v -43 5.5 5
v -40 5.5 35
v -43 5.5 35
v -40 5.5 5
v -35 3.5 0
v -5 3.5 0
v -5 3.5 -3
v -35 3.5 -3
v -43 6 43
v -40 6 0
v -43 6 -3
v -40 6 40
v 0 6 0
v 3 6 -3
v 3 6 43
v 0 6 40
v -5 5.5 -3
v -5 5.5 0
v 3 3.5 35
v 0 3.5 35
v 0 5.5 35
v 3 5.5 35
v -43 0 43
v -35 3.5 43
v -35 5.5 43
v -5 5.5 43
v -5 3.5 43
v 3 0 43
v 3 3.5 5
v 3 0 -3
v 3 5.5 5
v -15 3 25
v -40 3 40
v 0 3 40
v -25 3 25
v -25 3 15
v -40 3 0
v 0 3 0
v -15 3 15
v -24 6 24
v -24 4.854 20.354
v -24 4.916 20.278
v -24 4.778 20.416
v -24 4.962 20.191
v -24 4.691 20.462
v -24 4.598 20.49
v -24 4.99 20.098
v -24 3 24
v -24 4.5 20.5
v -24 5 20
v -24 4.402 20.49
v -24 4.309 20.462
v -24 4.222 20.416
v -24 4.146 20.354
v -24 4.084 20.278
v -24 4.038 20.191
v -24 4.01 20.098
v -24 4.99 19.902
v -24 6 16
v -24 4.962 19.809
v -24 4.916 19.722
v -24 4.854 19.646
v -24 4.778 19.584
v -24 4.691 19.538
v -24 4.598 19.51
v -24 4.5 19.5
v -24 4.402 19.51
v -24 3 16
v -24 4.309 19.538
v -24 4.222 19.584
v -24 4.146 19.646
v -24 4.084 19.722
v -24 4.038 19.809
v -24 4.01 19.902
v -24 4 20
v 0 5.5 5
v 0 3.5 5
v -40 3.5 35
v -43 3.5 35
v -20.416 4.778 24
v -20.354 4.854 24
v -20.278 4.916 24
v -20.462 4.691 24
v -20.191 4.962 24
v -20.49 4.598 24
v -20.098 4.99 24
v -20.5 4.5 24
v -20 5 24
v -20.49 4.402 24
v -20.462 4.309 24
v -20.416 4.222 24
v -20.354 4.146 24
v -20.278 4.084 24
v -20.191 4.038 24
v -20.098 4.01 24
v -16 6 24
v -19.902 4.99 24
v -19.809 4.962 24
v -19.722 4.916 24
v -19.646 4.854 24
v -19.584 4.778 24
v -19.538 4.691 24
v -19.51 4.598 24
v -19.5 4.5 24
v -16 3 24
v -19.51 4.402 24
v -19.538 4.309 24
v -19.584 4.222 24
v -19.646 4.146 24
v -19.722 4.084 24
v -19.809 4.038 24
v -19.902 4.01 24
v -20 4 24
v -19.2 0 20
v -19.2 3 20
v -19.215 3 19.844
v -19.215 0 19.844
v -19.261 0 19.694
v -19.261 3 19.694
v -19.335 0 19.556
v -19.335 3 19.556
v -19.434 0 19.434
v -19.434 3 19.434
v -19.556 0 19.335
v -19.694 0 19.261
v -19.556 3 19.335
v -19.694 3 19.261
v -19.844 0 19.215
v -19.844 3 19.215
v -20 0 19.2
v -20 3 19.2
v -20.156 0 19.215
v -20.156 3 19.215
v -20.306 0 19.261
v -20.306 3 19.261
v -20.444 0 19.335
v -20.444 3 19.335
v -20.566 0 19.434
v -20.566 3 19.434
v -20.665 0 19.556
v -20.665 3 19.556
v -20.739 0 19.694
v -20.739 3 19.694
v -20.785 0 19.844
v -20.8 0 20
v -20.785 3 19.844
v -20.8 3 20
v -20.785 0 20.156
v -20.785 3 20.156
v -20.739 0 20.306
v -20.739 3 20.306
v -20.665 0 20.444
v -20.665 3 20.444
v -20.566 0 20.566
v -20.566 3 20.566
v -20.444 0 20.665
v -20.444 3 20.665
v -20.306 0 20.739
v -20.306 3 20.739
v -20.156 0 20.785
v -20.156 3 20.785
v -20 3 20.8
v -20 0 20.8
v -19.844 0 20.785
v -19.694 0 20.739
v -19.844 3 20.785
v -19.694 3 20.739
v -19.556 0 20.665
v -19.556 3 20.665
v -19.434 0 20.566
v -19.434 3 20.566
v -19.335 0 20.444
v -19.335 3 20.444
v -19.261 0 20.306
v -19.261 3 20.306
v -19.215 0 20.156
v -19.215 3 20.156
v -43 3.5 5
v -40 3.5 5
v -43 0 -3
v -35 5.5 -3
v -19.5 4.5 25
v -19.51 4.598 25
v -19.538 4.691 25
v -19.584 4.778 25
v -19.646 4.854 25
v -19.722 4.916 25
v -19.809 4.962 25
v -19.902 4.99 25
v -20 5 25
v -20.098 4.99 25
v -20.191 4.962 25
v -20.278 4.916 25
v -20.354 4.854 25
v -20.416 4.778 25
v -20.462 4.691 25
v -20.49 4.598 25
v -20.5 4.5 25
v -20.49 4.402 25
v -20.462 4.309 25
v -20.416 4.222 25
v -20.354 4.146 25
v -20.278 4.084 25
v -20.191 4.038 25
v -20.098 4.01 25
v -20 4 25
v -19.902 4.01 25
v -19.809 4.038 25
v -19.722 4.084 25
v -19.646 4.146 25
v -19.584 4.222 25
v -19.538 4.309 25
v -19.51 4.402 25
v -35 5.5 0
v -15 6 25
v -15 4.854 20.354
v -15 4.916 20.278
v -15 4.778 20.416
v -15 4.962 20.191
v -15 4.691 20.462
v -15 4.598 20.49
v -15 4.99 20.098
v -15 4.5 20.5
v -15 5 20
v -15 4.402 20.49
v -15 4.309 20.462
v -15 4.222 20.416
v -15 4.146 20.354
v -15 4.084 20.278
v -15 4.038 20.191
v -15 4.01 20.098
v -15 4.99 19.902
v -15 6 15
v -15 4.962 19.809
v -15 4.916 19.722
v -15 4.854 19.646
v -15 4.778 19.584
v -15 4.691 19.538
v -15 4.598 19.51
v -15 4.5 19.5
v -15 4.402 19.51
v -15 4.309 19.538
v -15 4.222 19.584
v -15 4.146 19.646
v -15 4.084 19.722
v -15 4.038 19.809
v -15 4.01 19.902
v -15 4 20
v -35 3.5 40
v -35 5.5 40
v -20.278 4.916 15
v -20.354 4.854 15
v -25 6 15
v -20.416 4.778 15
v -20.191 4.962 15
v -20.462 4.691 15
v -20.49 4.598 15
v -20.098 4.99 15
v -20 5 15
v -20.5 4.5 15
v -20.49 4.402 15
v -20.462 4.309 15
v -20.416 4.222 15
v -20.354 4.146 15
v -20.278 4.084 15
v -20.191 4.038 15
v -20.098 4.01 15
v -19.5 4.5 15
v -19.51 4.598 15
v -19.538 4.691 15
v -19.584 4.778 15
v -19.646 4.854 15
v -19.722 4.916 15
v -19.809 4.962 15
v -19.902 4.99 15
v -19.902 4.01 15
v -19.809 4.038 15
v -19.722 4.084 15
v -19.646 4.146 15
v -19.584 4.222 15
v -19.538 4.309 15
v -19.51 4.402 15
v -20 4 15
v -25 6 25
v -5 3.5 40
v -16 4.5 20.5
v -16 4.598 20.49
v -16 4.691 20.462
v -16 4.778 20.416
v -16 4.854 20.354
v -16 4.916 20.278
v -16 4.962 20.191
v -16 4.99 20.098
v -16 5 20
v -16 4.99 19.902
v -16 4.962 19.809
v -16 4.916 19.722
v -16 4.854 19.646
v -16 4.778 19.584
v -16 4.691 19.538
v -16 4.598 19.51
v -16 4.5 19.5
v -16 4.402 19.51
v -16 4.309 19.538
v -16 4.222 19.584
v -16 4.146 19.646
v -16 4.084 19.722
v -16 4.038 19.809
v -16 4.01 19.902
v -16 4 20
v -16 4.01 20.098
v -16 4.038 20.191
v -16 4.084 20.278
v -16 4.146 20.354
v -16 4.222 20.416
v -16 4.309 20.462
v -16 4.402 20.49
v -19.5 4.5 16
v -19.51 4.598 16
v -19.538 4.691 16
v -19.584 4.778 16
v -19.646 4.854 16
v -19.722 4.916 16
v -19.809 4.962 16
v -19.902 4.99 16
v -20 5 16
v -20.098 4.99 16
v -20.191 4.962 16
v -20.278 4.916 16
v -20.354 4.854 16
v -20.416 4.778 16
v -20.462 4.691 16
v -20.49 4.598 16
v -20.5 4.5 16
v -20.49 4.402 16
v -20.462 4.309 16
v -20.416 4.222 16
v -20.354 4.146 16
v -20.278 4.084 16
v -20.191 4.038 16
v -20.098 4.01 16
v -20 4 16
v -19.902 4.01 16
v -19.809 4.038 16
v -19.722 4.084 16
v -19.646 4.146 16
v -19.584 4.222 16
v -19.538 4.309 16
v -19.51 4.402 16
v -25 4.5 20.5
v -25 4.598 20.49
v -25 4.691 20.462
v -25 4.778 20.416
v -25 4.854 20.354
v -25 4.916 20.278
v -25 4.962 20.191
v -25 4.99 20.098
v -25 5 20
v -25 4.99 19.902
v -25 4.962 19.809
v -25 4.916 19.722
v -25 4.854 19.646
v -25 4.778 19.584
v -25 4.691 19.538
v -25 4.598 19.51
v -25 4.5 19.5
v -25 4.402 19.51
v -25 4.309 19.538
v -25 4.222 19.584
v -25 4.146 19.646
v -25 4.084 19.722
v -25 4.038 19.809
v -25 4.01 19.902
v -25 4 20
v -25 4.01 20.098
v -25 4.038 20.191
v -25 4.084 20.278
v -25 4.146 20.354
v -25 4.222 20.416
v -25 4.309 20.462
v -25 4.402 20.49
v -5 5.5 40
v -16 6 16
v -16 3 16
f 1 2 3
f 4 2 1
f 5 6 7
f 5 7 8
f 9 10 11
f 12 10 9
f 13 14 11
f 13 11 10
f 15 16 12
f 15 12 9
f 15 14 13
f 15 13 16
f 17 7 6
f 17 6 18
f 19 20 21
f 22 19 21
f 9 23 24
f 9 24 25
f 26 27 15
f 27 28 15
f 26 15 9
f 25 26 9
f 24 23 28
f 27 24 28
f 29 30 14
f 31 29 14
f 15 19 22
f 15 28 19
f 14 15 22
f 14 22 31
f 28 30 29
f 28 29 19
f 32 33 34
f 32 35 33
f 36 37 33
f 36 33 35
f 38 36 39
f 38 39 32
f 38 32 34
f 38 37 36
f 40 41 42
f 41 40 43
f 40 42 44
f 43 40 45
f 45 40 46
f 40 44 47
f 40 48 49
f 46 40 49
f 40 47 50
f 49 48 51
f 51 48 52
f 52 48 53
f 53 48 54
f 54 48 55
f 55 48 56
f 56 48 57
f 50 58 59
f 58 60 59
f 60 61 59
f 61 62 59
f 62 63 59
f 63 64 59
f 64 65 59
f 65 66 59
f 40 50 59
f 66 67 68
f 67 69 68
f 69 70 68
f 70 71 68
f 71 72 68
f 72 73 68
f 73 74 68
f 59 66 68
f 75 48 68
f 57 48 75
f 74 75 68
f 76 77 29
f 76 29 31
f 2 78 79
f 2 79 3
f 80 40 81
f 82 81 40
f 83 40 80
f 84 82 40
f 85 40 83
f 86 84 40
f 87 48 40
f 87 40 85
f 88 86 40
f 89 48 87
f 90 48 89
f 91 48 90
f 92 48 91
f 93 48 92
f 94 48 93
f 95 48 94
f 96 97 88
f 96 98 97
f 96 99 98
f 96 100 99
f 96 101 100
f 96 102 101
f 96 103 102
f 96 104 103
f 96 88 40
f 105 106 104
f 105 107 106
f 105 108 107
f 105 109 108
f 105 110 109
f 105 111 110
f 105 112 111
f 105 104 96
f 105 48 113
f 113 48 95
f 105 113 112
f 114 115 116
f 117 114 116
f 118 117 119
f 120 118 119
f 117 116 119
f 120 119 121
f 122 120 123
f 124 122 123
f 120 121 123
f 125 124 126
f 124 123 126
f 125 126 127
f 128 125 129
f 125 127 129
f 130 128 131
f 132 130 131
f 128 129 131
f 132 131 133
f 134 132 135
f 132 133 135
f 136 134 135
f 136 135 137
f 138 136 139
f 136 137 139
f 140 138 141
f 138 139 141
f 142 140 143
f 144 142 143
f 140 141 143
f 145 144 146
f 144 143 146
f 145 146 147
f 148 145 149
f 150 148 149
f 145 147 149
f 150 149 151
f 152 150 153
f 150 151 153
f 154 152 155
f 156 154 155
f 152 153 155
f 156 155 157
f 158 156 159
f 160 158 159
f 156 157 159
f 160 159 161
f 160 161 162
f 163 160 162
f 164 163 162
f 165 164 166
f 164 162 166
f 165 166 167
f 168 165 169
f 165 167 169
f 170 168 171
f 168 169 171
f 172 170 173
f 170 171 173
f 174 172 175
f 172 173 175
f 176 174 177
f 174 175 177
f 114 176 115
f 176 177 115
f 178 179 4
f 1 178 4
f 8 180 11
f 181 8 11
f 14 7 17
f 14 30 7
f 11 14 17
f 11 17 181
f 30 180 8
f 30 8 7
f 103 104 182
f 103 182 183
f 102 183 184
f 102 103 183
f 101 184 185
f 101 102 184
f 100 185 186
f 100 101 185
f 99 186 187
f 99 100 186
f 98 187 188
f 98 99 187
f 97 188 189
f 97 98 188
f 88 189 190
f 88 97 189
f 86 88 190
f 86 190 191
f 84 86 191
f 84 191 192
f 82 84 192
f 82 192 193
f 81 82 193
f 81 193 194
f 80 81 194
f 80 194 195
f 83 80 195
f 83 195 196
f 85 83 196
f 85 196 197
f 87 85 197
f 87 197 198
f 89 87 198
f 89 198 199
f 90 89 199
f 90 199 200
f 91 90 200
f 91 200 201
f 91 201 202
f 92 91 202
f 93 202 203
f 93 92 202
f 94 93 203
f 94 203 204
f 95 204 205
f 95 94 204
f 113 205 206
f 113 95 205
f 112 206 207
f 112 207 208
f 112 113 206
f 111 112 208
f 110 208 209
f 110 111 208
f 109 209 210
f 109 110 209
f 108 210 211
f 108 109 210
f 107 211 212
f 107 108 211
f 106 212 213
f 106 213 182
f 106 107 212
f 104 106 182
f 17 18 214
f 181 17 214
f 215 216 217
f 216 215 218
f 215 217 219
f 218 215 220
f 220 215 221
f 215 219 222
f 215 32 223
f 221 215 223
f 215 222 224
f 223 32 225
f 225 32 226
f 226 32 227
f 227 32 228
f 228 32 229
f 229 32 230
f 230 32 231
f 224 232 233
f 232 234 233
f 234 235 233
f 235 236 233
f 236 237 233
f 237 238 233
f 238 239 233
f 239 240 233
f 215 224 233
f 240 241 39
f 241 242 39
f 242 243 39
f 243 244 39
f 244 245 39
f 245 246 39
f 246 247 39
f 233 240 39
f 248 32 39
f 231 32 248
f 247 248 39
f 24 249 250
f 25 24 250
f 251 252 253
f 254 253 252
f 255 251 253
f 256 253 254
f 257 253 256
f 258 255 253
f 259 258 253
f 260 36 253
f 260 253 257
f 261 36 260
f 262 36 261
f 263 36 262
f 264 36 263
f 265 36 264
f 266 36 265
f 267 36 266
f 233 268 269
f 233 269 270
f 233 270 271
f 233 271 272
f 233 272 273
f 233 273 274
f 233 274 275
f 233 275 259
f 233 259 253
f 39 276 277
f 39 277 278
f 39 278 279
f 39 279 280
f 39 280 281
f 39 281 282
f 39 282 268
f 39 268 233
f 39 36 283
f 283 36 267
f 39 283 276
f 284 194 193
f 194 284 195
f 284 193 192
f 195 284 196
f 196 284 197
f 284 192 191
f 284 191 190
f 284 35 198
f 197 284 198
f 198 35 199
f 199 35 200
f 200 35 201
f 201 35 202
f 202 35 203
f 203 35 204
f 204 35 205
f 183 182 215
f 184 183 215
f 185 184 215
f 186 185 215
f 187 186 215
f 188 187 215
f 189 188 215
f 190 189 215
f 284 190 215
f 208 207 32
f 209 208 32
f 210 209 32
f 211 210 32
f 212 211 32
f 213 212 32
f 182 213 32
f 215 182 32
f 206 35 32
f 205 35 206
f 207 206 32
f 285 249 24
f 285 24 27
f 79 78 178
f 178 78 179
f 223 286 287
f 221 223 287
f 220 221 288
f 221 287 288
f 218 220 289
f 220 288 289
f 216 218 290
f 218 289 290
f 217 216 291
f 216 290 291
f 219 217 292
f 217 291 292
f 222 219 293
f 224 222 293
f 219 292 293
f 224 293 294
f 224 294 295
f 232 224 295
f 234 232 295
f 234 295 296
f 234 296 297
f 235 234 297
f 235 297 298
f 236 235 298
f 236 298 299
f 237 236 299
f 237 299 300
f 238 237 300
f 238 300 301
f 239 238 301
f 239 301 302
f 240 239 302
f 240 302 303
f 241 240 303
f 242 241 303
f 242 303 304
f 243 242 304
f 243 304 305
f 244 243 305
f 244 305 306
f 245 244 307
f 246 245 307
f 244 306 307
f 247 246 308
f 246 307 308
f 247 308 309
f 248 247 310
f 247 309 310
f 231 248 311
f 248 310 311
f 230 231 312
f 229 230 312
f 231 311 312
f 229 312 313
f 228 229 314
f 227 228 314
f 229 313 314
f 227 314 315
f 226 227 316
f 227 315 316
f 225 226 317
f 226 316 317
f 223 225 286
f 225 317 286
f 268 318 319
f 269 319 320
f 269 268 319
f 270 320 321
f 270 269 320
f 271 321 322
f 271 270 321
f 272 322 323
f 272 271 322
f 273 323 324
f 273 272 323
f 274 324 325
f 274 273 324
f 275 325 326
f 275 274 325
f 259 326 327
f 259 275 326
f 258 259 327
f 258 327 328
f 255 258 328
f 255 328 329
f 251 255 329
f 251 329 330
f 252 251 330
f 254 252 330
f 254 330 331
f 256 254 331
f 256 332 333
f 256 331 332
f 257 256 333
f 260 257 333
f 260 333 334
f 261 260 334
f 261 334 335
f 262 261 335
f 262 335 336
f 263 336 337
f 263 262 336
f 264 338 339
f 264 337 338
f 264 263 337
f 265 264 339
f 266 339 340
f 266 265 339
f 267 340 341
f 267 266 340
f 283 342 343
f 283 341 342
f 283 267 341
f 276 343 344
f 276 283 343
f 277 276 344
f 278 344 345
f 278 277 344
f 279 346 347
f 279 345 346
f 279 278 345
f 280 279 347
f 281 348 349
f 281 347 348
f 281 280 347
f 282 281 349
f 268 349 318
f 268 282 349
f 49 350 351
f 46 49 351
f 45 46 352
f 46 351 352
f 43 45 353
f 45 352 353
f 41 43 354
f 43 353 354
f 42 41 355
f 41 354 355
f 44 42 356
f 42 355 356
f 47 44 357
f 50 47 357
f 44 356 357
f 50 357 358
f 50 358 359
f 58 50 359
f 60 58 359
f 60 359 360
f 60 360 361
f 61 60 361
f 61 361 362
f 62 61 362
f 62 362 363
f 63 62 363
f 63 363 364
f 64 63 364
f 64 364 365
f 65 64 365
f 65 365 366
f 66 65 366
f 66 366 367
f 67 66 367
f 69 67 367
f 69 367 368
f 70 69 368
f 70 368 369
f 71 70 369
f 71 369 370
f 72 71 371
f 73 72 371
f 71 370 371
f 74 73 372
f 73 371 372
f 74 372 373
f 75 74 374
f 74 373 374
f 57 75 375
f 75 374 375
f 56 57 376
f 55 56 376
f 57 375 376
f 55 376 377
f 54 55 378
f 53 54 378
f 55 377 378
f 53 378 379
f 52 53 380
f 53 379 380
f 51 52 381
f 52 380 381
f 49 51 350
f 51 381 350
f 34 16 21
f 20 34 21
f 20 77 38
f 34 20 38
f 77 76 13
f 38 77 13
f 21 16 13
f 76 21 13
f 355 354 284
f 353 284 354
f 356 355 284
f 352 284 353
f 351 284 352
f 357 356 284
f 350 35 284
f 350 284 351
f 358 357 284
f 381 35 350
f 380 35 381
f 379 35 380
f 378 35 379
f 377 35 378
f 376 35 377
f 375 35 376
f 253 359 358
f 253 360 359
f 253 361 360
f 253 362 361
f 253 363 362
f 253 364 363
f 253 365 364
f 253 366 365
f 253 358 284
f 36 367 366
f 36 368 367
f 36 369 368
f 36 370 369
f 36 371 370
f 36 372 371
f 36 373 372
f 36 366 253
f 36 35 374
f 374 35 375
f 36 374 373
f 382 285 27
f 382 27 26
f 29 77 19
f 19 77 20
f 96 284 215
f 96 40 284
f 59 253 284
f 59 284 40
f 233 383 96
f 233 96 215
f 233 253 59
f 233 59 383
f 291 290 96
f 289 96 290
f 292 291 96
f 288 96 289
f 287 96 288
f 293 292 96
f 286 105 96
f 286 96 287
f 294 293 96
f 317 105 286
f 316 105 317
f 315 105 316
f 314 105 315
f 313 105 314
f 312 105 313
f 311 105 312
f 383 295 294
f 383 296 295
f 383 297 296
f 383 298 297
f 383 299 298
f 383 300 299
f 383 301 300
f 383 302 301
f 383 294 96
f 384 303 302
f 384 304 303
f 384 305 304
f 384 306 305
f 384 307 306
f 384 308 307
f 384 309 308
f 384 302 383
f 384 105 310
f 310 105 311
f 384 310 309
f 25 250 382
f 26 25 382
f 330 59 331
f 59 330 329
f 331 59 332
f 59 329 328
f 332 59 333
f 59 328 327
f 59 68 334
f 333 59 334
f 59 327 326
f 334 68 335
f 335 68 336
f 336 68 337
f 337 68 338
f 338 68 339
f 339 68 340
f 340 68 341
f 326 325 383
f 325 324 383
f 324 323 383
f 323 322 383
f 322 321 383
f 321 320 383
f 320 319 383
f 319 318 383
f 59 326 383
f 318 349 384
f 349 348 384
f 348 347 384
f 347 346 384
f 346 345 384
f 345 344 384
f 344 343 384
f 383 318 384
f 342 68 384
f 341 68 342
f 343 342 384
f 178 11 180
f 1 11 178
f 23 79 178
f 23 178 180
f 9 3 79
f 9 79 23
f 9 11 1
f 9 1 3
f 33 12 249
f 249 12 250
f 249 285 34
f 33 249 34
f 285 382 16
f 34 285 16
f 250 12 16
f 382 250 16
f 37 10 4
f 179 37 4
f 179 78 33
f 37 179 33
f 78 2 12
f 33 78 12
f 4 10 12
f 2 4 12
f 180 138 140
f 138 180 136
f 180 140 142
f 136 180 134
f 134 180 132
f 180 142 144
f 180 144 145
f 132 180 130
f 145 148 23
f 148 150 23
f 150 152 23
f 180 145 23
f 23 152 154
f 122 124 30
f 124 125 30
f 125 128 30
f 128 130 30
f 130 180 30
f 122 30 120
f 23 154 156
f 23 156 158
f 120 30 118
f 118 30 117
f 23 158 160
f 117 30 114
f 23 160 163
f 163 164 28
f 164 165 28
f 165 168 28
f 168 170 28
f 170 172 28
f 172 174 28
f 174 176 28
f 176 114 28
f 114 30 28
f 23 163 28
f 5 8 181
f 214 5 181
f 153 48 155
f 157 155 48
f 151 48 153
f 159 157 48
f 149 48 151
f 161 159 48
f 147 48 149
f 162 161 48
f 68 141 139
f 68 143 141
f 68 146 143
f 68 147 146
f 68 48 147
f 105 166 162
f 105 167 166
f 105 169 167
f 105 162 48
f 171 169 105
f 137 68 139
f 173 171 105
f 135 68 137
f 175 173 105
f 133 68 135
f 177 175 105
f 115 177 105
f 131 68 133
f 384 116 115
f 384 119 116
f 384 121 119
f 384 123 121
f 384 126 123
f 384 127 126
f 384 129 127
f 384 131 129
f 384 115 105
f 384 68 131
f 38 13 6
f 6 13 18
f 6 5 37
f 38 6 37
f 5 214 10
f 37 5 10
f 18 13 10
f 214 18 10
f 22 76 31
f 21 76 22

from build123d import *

# Parameters (mm, degrees)
SKETCH1_W               = 40
SKETCH1_H               = 40
BOSS_EXTRUDE1_DEPTH     = 3
SKETCH2_W               = 40
SKETCH2_H               = 6
BOSS_EXTRUDE2_DEPTH     = 3
SKETCH4_W               = 43
SKETCH4_H               = 6
BOSS_EXTRUDE3_DEPTH     = 3
SKETCH5_W               = 43
SKETCH5_H               = 6
BOSS_EXTRUDE4_DEPTH     = 3
SKETCH6_W               = 46
SKETCH6_H               = 6
BOSS_EXTRUDE5_DEPTH     = 3
SKETCH7_W               = 30
SKETCH7_H               = 2
CUT_EXTRUDE1_DEPTH      = 3
MIRROR2_COPY_1_SKETCH_W = 30
MIRROR2_COPY_1_SKETCH_H = 2
MIRROR2_COPY_1_DEPTH    = 3
SKETCH8_W               = 10
SKETCH8_H               = 10
SKETCH8_W_2             = 7.999655552
SKETCH8_H_2             = 7.999655552
BOSS_EXTRUDE6_DEPTH     = 3
SKETCH9_R               = 0.8
CUT_EXTRUDE2_DEPTH      = 3
SKETCH10_R              = 0.5
CUT_EXTRUDE3_DEPTH      = 10


with BuildPart() as part:
    # Sketch1 → Boss-Extrude1 (new body)
    with BuildSketch(Plane(origin=(0, 0, 0), x_dir=(1, 0, 0), z_dir=(0, 1, 0))):
        with Locations((-20, -20)):
            Rectangle(SKETCH1_W, SKETCH1_H)
    extrude(amount=BOSS_EXTRUDE1_DEPTH)



with BuildPart() as body_2:
    # Sketch2 → Boss-Extrude2 (new body)
    with BuildSketch(Plane(origin=(0, 0, 0), x_dir=(0, 0, -1), z_dir=(1, 0, 0))):
        with Locations((-20, 3)):
            Rectangle(SKETCH2_W, SKETCH2_H)
    extrude(amount=BOSS_EXTRUDE2_DEPTH)


with BuildPart() as part_1:
    add(part.part)

    add(body_2.part)  # Boss-Extrude3 merges body 2
    # Sketch4 → Boss-Extrude3 (add)
    with BuildSketch(Plane.XY.offset(40)):
        with Locations((-18.5, 3)):
            Rectangle(SKETCH4_W, SKETCH4_H)
    extrude(amount=BOSS_EXTRUDE3_DEPTH)

    # Sketch5 → Boss-Extrude4 (add)
    with BuildSketch(Plane(origin=(0, 0, 0), x_dir=(-1, 0, 0), z_dir=(0, 0, -1))):
        with Locations((18.5, 3)):
            Rectangle(SKETCH5_W, SKETCH5_H)
    extrude(amount=BOSS_EXTRUDE4_DEPTH)

    # Sketch6 → Boss-Extrude5 (add)
    with BuildSketch(Plane.ZY.offset(40)):
        with Locations((20, 3)):
            Rectangle(SKETCH6_W, SKETCH6_H)
    extrude(amount=BOSS_EXTRUDE5_DEPTH)

    # Sketch7 → Cut-Extrude1 (cut)
    with BuildSketch(Plane.ZY):
        with Locations((20, 4.5)):
            Rectangle(SKETCH7_W, SKETCH7_H)
    cut_extrude1 = extrude(amount=-CUT_EXTRUDE1_DEPTH, mode=Mode.SUBTRACT)

    # Mirror1: Cut-Extrude1 across plane
    add(cut_extrude1.mirror(Plane(origin=(0, 0, 0), x_dir=(-0.707106781, 0, 0.707106781), z_dir=(0.707106781, 0, 0.707106781))), mode=Mode.SUBTRACT)

    # Mirror2: Cut-Extrude1 across plane
    add(cut_extrude1.mirror(Plane(origin=(-20, 0, 20), x_dir=(0.707106781, 0, 0.707106781), z_dir=(0.707106781, 0, -0.707106781))), mode=Mode.SUBTRACT)

    # Mirror2 copy 1 sketch → Mirror2 copy 1 (cut)
    with BuildSketch(Plane(origin=(-40, 0, 40), x_dir=(0, 0, -1), z_dir=(1, 0, 0))):
        with Locations((20, 4.5)):
            Rectangle(MIRROR2_COPY_1_SKETCH_W, MIRROR2_COPY_1_SKETCH_H)
    extrude(amount=-MIRROR2_COPY_1_DEPTH, mode=Mode.SUBTRACT)

    # Sketch8 → Boss-Extrude6 (add)
    with BuildSketch(Plane(origin=(0, 3, 0), x_dir=(1, 0, 0), z_dir=(0, 1, 0))):
        with Locations((-20, -20)):
            Rectangle(SKETCH8_W, SKETCH8_H)
        with Locations((-20, -20)):
            Rectangle(SKETCH8_W_2, SKETCH8_H_2, mode=Mode.SUBTRACT)
    extrude(amount=BOSS_EXTRUDE6_DEPTH)

    # Sketch9 → Cut-Extrude2 (cut)
    with BuildSketch(Plane(origin=(0, 3, 0), x_dir=(1, 0, 0), z_dir=(0, 1, 0))):
        with Locations((-20, -20)):
            Circle(SKETCH9_R)
    extrude(amount=-CUT_EXTRUDE2_DEPTH, mode=Mode.SUBTRACT)

    # Sketch10 → Cut-Extrude3 (cut)
    with BuildSketch(Plane.ZY.offset(25)):
        with Locations((20, 4.5)):
            Circle(SKETCH10_R)
    cut_extrude3 = extrude(amount=-CUT_EXTRUDE3_DEPTH, mode=Mode.SUBTRACT)

    # Mirror3: Cut-Extrude3 across plane
    add(cut_extrude3.mirror(Plane(origin=(-20, 0, 20), x_dir=(0.707106781, 0, 0.707106781), z_dir=(0.707106781, 0, -0.707106781))), mode=Mode.SUBTRACT)


solid = part_1.part
